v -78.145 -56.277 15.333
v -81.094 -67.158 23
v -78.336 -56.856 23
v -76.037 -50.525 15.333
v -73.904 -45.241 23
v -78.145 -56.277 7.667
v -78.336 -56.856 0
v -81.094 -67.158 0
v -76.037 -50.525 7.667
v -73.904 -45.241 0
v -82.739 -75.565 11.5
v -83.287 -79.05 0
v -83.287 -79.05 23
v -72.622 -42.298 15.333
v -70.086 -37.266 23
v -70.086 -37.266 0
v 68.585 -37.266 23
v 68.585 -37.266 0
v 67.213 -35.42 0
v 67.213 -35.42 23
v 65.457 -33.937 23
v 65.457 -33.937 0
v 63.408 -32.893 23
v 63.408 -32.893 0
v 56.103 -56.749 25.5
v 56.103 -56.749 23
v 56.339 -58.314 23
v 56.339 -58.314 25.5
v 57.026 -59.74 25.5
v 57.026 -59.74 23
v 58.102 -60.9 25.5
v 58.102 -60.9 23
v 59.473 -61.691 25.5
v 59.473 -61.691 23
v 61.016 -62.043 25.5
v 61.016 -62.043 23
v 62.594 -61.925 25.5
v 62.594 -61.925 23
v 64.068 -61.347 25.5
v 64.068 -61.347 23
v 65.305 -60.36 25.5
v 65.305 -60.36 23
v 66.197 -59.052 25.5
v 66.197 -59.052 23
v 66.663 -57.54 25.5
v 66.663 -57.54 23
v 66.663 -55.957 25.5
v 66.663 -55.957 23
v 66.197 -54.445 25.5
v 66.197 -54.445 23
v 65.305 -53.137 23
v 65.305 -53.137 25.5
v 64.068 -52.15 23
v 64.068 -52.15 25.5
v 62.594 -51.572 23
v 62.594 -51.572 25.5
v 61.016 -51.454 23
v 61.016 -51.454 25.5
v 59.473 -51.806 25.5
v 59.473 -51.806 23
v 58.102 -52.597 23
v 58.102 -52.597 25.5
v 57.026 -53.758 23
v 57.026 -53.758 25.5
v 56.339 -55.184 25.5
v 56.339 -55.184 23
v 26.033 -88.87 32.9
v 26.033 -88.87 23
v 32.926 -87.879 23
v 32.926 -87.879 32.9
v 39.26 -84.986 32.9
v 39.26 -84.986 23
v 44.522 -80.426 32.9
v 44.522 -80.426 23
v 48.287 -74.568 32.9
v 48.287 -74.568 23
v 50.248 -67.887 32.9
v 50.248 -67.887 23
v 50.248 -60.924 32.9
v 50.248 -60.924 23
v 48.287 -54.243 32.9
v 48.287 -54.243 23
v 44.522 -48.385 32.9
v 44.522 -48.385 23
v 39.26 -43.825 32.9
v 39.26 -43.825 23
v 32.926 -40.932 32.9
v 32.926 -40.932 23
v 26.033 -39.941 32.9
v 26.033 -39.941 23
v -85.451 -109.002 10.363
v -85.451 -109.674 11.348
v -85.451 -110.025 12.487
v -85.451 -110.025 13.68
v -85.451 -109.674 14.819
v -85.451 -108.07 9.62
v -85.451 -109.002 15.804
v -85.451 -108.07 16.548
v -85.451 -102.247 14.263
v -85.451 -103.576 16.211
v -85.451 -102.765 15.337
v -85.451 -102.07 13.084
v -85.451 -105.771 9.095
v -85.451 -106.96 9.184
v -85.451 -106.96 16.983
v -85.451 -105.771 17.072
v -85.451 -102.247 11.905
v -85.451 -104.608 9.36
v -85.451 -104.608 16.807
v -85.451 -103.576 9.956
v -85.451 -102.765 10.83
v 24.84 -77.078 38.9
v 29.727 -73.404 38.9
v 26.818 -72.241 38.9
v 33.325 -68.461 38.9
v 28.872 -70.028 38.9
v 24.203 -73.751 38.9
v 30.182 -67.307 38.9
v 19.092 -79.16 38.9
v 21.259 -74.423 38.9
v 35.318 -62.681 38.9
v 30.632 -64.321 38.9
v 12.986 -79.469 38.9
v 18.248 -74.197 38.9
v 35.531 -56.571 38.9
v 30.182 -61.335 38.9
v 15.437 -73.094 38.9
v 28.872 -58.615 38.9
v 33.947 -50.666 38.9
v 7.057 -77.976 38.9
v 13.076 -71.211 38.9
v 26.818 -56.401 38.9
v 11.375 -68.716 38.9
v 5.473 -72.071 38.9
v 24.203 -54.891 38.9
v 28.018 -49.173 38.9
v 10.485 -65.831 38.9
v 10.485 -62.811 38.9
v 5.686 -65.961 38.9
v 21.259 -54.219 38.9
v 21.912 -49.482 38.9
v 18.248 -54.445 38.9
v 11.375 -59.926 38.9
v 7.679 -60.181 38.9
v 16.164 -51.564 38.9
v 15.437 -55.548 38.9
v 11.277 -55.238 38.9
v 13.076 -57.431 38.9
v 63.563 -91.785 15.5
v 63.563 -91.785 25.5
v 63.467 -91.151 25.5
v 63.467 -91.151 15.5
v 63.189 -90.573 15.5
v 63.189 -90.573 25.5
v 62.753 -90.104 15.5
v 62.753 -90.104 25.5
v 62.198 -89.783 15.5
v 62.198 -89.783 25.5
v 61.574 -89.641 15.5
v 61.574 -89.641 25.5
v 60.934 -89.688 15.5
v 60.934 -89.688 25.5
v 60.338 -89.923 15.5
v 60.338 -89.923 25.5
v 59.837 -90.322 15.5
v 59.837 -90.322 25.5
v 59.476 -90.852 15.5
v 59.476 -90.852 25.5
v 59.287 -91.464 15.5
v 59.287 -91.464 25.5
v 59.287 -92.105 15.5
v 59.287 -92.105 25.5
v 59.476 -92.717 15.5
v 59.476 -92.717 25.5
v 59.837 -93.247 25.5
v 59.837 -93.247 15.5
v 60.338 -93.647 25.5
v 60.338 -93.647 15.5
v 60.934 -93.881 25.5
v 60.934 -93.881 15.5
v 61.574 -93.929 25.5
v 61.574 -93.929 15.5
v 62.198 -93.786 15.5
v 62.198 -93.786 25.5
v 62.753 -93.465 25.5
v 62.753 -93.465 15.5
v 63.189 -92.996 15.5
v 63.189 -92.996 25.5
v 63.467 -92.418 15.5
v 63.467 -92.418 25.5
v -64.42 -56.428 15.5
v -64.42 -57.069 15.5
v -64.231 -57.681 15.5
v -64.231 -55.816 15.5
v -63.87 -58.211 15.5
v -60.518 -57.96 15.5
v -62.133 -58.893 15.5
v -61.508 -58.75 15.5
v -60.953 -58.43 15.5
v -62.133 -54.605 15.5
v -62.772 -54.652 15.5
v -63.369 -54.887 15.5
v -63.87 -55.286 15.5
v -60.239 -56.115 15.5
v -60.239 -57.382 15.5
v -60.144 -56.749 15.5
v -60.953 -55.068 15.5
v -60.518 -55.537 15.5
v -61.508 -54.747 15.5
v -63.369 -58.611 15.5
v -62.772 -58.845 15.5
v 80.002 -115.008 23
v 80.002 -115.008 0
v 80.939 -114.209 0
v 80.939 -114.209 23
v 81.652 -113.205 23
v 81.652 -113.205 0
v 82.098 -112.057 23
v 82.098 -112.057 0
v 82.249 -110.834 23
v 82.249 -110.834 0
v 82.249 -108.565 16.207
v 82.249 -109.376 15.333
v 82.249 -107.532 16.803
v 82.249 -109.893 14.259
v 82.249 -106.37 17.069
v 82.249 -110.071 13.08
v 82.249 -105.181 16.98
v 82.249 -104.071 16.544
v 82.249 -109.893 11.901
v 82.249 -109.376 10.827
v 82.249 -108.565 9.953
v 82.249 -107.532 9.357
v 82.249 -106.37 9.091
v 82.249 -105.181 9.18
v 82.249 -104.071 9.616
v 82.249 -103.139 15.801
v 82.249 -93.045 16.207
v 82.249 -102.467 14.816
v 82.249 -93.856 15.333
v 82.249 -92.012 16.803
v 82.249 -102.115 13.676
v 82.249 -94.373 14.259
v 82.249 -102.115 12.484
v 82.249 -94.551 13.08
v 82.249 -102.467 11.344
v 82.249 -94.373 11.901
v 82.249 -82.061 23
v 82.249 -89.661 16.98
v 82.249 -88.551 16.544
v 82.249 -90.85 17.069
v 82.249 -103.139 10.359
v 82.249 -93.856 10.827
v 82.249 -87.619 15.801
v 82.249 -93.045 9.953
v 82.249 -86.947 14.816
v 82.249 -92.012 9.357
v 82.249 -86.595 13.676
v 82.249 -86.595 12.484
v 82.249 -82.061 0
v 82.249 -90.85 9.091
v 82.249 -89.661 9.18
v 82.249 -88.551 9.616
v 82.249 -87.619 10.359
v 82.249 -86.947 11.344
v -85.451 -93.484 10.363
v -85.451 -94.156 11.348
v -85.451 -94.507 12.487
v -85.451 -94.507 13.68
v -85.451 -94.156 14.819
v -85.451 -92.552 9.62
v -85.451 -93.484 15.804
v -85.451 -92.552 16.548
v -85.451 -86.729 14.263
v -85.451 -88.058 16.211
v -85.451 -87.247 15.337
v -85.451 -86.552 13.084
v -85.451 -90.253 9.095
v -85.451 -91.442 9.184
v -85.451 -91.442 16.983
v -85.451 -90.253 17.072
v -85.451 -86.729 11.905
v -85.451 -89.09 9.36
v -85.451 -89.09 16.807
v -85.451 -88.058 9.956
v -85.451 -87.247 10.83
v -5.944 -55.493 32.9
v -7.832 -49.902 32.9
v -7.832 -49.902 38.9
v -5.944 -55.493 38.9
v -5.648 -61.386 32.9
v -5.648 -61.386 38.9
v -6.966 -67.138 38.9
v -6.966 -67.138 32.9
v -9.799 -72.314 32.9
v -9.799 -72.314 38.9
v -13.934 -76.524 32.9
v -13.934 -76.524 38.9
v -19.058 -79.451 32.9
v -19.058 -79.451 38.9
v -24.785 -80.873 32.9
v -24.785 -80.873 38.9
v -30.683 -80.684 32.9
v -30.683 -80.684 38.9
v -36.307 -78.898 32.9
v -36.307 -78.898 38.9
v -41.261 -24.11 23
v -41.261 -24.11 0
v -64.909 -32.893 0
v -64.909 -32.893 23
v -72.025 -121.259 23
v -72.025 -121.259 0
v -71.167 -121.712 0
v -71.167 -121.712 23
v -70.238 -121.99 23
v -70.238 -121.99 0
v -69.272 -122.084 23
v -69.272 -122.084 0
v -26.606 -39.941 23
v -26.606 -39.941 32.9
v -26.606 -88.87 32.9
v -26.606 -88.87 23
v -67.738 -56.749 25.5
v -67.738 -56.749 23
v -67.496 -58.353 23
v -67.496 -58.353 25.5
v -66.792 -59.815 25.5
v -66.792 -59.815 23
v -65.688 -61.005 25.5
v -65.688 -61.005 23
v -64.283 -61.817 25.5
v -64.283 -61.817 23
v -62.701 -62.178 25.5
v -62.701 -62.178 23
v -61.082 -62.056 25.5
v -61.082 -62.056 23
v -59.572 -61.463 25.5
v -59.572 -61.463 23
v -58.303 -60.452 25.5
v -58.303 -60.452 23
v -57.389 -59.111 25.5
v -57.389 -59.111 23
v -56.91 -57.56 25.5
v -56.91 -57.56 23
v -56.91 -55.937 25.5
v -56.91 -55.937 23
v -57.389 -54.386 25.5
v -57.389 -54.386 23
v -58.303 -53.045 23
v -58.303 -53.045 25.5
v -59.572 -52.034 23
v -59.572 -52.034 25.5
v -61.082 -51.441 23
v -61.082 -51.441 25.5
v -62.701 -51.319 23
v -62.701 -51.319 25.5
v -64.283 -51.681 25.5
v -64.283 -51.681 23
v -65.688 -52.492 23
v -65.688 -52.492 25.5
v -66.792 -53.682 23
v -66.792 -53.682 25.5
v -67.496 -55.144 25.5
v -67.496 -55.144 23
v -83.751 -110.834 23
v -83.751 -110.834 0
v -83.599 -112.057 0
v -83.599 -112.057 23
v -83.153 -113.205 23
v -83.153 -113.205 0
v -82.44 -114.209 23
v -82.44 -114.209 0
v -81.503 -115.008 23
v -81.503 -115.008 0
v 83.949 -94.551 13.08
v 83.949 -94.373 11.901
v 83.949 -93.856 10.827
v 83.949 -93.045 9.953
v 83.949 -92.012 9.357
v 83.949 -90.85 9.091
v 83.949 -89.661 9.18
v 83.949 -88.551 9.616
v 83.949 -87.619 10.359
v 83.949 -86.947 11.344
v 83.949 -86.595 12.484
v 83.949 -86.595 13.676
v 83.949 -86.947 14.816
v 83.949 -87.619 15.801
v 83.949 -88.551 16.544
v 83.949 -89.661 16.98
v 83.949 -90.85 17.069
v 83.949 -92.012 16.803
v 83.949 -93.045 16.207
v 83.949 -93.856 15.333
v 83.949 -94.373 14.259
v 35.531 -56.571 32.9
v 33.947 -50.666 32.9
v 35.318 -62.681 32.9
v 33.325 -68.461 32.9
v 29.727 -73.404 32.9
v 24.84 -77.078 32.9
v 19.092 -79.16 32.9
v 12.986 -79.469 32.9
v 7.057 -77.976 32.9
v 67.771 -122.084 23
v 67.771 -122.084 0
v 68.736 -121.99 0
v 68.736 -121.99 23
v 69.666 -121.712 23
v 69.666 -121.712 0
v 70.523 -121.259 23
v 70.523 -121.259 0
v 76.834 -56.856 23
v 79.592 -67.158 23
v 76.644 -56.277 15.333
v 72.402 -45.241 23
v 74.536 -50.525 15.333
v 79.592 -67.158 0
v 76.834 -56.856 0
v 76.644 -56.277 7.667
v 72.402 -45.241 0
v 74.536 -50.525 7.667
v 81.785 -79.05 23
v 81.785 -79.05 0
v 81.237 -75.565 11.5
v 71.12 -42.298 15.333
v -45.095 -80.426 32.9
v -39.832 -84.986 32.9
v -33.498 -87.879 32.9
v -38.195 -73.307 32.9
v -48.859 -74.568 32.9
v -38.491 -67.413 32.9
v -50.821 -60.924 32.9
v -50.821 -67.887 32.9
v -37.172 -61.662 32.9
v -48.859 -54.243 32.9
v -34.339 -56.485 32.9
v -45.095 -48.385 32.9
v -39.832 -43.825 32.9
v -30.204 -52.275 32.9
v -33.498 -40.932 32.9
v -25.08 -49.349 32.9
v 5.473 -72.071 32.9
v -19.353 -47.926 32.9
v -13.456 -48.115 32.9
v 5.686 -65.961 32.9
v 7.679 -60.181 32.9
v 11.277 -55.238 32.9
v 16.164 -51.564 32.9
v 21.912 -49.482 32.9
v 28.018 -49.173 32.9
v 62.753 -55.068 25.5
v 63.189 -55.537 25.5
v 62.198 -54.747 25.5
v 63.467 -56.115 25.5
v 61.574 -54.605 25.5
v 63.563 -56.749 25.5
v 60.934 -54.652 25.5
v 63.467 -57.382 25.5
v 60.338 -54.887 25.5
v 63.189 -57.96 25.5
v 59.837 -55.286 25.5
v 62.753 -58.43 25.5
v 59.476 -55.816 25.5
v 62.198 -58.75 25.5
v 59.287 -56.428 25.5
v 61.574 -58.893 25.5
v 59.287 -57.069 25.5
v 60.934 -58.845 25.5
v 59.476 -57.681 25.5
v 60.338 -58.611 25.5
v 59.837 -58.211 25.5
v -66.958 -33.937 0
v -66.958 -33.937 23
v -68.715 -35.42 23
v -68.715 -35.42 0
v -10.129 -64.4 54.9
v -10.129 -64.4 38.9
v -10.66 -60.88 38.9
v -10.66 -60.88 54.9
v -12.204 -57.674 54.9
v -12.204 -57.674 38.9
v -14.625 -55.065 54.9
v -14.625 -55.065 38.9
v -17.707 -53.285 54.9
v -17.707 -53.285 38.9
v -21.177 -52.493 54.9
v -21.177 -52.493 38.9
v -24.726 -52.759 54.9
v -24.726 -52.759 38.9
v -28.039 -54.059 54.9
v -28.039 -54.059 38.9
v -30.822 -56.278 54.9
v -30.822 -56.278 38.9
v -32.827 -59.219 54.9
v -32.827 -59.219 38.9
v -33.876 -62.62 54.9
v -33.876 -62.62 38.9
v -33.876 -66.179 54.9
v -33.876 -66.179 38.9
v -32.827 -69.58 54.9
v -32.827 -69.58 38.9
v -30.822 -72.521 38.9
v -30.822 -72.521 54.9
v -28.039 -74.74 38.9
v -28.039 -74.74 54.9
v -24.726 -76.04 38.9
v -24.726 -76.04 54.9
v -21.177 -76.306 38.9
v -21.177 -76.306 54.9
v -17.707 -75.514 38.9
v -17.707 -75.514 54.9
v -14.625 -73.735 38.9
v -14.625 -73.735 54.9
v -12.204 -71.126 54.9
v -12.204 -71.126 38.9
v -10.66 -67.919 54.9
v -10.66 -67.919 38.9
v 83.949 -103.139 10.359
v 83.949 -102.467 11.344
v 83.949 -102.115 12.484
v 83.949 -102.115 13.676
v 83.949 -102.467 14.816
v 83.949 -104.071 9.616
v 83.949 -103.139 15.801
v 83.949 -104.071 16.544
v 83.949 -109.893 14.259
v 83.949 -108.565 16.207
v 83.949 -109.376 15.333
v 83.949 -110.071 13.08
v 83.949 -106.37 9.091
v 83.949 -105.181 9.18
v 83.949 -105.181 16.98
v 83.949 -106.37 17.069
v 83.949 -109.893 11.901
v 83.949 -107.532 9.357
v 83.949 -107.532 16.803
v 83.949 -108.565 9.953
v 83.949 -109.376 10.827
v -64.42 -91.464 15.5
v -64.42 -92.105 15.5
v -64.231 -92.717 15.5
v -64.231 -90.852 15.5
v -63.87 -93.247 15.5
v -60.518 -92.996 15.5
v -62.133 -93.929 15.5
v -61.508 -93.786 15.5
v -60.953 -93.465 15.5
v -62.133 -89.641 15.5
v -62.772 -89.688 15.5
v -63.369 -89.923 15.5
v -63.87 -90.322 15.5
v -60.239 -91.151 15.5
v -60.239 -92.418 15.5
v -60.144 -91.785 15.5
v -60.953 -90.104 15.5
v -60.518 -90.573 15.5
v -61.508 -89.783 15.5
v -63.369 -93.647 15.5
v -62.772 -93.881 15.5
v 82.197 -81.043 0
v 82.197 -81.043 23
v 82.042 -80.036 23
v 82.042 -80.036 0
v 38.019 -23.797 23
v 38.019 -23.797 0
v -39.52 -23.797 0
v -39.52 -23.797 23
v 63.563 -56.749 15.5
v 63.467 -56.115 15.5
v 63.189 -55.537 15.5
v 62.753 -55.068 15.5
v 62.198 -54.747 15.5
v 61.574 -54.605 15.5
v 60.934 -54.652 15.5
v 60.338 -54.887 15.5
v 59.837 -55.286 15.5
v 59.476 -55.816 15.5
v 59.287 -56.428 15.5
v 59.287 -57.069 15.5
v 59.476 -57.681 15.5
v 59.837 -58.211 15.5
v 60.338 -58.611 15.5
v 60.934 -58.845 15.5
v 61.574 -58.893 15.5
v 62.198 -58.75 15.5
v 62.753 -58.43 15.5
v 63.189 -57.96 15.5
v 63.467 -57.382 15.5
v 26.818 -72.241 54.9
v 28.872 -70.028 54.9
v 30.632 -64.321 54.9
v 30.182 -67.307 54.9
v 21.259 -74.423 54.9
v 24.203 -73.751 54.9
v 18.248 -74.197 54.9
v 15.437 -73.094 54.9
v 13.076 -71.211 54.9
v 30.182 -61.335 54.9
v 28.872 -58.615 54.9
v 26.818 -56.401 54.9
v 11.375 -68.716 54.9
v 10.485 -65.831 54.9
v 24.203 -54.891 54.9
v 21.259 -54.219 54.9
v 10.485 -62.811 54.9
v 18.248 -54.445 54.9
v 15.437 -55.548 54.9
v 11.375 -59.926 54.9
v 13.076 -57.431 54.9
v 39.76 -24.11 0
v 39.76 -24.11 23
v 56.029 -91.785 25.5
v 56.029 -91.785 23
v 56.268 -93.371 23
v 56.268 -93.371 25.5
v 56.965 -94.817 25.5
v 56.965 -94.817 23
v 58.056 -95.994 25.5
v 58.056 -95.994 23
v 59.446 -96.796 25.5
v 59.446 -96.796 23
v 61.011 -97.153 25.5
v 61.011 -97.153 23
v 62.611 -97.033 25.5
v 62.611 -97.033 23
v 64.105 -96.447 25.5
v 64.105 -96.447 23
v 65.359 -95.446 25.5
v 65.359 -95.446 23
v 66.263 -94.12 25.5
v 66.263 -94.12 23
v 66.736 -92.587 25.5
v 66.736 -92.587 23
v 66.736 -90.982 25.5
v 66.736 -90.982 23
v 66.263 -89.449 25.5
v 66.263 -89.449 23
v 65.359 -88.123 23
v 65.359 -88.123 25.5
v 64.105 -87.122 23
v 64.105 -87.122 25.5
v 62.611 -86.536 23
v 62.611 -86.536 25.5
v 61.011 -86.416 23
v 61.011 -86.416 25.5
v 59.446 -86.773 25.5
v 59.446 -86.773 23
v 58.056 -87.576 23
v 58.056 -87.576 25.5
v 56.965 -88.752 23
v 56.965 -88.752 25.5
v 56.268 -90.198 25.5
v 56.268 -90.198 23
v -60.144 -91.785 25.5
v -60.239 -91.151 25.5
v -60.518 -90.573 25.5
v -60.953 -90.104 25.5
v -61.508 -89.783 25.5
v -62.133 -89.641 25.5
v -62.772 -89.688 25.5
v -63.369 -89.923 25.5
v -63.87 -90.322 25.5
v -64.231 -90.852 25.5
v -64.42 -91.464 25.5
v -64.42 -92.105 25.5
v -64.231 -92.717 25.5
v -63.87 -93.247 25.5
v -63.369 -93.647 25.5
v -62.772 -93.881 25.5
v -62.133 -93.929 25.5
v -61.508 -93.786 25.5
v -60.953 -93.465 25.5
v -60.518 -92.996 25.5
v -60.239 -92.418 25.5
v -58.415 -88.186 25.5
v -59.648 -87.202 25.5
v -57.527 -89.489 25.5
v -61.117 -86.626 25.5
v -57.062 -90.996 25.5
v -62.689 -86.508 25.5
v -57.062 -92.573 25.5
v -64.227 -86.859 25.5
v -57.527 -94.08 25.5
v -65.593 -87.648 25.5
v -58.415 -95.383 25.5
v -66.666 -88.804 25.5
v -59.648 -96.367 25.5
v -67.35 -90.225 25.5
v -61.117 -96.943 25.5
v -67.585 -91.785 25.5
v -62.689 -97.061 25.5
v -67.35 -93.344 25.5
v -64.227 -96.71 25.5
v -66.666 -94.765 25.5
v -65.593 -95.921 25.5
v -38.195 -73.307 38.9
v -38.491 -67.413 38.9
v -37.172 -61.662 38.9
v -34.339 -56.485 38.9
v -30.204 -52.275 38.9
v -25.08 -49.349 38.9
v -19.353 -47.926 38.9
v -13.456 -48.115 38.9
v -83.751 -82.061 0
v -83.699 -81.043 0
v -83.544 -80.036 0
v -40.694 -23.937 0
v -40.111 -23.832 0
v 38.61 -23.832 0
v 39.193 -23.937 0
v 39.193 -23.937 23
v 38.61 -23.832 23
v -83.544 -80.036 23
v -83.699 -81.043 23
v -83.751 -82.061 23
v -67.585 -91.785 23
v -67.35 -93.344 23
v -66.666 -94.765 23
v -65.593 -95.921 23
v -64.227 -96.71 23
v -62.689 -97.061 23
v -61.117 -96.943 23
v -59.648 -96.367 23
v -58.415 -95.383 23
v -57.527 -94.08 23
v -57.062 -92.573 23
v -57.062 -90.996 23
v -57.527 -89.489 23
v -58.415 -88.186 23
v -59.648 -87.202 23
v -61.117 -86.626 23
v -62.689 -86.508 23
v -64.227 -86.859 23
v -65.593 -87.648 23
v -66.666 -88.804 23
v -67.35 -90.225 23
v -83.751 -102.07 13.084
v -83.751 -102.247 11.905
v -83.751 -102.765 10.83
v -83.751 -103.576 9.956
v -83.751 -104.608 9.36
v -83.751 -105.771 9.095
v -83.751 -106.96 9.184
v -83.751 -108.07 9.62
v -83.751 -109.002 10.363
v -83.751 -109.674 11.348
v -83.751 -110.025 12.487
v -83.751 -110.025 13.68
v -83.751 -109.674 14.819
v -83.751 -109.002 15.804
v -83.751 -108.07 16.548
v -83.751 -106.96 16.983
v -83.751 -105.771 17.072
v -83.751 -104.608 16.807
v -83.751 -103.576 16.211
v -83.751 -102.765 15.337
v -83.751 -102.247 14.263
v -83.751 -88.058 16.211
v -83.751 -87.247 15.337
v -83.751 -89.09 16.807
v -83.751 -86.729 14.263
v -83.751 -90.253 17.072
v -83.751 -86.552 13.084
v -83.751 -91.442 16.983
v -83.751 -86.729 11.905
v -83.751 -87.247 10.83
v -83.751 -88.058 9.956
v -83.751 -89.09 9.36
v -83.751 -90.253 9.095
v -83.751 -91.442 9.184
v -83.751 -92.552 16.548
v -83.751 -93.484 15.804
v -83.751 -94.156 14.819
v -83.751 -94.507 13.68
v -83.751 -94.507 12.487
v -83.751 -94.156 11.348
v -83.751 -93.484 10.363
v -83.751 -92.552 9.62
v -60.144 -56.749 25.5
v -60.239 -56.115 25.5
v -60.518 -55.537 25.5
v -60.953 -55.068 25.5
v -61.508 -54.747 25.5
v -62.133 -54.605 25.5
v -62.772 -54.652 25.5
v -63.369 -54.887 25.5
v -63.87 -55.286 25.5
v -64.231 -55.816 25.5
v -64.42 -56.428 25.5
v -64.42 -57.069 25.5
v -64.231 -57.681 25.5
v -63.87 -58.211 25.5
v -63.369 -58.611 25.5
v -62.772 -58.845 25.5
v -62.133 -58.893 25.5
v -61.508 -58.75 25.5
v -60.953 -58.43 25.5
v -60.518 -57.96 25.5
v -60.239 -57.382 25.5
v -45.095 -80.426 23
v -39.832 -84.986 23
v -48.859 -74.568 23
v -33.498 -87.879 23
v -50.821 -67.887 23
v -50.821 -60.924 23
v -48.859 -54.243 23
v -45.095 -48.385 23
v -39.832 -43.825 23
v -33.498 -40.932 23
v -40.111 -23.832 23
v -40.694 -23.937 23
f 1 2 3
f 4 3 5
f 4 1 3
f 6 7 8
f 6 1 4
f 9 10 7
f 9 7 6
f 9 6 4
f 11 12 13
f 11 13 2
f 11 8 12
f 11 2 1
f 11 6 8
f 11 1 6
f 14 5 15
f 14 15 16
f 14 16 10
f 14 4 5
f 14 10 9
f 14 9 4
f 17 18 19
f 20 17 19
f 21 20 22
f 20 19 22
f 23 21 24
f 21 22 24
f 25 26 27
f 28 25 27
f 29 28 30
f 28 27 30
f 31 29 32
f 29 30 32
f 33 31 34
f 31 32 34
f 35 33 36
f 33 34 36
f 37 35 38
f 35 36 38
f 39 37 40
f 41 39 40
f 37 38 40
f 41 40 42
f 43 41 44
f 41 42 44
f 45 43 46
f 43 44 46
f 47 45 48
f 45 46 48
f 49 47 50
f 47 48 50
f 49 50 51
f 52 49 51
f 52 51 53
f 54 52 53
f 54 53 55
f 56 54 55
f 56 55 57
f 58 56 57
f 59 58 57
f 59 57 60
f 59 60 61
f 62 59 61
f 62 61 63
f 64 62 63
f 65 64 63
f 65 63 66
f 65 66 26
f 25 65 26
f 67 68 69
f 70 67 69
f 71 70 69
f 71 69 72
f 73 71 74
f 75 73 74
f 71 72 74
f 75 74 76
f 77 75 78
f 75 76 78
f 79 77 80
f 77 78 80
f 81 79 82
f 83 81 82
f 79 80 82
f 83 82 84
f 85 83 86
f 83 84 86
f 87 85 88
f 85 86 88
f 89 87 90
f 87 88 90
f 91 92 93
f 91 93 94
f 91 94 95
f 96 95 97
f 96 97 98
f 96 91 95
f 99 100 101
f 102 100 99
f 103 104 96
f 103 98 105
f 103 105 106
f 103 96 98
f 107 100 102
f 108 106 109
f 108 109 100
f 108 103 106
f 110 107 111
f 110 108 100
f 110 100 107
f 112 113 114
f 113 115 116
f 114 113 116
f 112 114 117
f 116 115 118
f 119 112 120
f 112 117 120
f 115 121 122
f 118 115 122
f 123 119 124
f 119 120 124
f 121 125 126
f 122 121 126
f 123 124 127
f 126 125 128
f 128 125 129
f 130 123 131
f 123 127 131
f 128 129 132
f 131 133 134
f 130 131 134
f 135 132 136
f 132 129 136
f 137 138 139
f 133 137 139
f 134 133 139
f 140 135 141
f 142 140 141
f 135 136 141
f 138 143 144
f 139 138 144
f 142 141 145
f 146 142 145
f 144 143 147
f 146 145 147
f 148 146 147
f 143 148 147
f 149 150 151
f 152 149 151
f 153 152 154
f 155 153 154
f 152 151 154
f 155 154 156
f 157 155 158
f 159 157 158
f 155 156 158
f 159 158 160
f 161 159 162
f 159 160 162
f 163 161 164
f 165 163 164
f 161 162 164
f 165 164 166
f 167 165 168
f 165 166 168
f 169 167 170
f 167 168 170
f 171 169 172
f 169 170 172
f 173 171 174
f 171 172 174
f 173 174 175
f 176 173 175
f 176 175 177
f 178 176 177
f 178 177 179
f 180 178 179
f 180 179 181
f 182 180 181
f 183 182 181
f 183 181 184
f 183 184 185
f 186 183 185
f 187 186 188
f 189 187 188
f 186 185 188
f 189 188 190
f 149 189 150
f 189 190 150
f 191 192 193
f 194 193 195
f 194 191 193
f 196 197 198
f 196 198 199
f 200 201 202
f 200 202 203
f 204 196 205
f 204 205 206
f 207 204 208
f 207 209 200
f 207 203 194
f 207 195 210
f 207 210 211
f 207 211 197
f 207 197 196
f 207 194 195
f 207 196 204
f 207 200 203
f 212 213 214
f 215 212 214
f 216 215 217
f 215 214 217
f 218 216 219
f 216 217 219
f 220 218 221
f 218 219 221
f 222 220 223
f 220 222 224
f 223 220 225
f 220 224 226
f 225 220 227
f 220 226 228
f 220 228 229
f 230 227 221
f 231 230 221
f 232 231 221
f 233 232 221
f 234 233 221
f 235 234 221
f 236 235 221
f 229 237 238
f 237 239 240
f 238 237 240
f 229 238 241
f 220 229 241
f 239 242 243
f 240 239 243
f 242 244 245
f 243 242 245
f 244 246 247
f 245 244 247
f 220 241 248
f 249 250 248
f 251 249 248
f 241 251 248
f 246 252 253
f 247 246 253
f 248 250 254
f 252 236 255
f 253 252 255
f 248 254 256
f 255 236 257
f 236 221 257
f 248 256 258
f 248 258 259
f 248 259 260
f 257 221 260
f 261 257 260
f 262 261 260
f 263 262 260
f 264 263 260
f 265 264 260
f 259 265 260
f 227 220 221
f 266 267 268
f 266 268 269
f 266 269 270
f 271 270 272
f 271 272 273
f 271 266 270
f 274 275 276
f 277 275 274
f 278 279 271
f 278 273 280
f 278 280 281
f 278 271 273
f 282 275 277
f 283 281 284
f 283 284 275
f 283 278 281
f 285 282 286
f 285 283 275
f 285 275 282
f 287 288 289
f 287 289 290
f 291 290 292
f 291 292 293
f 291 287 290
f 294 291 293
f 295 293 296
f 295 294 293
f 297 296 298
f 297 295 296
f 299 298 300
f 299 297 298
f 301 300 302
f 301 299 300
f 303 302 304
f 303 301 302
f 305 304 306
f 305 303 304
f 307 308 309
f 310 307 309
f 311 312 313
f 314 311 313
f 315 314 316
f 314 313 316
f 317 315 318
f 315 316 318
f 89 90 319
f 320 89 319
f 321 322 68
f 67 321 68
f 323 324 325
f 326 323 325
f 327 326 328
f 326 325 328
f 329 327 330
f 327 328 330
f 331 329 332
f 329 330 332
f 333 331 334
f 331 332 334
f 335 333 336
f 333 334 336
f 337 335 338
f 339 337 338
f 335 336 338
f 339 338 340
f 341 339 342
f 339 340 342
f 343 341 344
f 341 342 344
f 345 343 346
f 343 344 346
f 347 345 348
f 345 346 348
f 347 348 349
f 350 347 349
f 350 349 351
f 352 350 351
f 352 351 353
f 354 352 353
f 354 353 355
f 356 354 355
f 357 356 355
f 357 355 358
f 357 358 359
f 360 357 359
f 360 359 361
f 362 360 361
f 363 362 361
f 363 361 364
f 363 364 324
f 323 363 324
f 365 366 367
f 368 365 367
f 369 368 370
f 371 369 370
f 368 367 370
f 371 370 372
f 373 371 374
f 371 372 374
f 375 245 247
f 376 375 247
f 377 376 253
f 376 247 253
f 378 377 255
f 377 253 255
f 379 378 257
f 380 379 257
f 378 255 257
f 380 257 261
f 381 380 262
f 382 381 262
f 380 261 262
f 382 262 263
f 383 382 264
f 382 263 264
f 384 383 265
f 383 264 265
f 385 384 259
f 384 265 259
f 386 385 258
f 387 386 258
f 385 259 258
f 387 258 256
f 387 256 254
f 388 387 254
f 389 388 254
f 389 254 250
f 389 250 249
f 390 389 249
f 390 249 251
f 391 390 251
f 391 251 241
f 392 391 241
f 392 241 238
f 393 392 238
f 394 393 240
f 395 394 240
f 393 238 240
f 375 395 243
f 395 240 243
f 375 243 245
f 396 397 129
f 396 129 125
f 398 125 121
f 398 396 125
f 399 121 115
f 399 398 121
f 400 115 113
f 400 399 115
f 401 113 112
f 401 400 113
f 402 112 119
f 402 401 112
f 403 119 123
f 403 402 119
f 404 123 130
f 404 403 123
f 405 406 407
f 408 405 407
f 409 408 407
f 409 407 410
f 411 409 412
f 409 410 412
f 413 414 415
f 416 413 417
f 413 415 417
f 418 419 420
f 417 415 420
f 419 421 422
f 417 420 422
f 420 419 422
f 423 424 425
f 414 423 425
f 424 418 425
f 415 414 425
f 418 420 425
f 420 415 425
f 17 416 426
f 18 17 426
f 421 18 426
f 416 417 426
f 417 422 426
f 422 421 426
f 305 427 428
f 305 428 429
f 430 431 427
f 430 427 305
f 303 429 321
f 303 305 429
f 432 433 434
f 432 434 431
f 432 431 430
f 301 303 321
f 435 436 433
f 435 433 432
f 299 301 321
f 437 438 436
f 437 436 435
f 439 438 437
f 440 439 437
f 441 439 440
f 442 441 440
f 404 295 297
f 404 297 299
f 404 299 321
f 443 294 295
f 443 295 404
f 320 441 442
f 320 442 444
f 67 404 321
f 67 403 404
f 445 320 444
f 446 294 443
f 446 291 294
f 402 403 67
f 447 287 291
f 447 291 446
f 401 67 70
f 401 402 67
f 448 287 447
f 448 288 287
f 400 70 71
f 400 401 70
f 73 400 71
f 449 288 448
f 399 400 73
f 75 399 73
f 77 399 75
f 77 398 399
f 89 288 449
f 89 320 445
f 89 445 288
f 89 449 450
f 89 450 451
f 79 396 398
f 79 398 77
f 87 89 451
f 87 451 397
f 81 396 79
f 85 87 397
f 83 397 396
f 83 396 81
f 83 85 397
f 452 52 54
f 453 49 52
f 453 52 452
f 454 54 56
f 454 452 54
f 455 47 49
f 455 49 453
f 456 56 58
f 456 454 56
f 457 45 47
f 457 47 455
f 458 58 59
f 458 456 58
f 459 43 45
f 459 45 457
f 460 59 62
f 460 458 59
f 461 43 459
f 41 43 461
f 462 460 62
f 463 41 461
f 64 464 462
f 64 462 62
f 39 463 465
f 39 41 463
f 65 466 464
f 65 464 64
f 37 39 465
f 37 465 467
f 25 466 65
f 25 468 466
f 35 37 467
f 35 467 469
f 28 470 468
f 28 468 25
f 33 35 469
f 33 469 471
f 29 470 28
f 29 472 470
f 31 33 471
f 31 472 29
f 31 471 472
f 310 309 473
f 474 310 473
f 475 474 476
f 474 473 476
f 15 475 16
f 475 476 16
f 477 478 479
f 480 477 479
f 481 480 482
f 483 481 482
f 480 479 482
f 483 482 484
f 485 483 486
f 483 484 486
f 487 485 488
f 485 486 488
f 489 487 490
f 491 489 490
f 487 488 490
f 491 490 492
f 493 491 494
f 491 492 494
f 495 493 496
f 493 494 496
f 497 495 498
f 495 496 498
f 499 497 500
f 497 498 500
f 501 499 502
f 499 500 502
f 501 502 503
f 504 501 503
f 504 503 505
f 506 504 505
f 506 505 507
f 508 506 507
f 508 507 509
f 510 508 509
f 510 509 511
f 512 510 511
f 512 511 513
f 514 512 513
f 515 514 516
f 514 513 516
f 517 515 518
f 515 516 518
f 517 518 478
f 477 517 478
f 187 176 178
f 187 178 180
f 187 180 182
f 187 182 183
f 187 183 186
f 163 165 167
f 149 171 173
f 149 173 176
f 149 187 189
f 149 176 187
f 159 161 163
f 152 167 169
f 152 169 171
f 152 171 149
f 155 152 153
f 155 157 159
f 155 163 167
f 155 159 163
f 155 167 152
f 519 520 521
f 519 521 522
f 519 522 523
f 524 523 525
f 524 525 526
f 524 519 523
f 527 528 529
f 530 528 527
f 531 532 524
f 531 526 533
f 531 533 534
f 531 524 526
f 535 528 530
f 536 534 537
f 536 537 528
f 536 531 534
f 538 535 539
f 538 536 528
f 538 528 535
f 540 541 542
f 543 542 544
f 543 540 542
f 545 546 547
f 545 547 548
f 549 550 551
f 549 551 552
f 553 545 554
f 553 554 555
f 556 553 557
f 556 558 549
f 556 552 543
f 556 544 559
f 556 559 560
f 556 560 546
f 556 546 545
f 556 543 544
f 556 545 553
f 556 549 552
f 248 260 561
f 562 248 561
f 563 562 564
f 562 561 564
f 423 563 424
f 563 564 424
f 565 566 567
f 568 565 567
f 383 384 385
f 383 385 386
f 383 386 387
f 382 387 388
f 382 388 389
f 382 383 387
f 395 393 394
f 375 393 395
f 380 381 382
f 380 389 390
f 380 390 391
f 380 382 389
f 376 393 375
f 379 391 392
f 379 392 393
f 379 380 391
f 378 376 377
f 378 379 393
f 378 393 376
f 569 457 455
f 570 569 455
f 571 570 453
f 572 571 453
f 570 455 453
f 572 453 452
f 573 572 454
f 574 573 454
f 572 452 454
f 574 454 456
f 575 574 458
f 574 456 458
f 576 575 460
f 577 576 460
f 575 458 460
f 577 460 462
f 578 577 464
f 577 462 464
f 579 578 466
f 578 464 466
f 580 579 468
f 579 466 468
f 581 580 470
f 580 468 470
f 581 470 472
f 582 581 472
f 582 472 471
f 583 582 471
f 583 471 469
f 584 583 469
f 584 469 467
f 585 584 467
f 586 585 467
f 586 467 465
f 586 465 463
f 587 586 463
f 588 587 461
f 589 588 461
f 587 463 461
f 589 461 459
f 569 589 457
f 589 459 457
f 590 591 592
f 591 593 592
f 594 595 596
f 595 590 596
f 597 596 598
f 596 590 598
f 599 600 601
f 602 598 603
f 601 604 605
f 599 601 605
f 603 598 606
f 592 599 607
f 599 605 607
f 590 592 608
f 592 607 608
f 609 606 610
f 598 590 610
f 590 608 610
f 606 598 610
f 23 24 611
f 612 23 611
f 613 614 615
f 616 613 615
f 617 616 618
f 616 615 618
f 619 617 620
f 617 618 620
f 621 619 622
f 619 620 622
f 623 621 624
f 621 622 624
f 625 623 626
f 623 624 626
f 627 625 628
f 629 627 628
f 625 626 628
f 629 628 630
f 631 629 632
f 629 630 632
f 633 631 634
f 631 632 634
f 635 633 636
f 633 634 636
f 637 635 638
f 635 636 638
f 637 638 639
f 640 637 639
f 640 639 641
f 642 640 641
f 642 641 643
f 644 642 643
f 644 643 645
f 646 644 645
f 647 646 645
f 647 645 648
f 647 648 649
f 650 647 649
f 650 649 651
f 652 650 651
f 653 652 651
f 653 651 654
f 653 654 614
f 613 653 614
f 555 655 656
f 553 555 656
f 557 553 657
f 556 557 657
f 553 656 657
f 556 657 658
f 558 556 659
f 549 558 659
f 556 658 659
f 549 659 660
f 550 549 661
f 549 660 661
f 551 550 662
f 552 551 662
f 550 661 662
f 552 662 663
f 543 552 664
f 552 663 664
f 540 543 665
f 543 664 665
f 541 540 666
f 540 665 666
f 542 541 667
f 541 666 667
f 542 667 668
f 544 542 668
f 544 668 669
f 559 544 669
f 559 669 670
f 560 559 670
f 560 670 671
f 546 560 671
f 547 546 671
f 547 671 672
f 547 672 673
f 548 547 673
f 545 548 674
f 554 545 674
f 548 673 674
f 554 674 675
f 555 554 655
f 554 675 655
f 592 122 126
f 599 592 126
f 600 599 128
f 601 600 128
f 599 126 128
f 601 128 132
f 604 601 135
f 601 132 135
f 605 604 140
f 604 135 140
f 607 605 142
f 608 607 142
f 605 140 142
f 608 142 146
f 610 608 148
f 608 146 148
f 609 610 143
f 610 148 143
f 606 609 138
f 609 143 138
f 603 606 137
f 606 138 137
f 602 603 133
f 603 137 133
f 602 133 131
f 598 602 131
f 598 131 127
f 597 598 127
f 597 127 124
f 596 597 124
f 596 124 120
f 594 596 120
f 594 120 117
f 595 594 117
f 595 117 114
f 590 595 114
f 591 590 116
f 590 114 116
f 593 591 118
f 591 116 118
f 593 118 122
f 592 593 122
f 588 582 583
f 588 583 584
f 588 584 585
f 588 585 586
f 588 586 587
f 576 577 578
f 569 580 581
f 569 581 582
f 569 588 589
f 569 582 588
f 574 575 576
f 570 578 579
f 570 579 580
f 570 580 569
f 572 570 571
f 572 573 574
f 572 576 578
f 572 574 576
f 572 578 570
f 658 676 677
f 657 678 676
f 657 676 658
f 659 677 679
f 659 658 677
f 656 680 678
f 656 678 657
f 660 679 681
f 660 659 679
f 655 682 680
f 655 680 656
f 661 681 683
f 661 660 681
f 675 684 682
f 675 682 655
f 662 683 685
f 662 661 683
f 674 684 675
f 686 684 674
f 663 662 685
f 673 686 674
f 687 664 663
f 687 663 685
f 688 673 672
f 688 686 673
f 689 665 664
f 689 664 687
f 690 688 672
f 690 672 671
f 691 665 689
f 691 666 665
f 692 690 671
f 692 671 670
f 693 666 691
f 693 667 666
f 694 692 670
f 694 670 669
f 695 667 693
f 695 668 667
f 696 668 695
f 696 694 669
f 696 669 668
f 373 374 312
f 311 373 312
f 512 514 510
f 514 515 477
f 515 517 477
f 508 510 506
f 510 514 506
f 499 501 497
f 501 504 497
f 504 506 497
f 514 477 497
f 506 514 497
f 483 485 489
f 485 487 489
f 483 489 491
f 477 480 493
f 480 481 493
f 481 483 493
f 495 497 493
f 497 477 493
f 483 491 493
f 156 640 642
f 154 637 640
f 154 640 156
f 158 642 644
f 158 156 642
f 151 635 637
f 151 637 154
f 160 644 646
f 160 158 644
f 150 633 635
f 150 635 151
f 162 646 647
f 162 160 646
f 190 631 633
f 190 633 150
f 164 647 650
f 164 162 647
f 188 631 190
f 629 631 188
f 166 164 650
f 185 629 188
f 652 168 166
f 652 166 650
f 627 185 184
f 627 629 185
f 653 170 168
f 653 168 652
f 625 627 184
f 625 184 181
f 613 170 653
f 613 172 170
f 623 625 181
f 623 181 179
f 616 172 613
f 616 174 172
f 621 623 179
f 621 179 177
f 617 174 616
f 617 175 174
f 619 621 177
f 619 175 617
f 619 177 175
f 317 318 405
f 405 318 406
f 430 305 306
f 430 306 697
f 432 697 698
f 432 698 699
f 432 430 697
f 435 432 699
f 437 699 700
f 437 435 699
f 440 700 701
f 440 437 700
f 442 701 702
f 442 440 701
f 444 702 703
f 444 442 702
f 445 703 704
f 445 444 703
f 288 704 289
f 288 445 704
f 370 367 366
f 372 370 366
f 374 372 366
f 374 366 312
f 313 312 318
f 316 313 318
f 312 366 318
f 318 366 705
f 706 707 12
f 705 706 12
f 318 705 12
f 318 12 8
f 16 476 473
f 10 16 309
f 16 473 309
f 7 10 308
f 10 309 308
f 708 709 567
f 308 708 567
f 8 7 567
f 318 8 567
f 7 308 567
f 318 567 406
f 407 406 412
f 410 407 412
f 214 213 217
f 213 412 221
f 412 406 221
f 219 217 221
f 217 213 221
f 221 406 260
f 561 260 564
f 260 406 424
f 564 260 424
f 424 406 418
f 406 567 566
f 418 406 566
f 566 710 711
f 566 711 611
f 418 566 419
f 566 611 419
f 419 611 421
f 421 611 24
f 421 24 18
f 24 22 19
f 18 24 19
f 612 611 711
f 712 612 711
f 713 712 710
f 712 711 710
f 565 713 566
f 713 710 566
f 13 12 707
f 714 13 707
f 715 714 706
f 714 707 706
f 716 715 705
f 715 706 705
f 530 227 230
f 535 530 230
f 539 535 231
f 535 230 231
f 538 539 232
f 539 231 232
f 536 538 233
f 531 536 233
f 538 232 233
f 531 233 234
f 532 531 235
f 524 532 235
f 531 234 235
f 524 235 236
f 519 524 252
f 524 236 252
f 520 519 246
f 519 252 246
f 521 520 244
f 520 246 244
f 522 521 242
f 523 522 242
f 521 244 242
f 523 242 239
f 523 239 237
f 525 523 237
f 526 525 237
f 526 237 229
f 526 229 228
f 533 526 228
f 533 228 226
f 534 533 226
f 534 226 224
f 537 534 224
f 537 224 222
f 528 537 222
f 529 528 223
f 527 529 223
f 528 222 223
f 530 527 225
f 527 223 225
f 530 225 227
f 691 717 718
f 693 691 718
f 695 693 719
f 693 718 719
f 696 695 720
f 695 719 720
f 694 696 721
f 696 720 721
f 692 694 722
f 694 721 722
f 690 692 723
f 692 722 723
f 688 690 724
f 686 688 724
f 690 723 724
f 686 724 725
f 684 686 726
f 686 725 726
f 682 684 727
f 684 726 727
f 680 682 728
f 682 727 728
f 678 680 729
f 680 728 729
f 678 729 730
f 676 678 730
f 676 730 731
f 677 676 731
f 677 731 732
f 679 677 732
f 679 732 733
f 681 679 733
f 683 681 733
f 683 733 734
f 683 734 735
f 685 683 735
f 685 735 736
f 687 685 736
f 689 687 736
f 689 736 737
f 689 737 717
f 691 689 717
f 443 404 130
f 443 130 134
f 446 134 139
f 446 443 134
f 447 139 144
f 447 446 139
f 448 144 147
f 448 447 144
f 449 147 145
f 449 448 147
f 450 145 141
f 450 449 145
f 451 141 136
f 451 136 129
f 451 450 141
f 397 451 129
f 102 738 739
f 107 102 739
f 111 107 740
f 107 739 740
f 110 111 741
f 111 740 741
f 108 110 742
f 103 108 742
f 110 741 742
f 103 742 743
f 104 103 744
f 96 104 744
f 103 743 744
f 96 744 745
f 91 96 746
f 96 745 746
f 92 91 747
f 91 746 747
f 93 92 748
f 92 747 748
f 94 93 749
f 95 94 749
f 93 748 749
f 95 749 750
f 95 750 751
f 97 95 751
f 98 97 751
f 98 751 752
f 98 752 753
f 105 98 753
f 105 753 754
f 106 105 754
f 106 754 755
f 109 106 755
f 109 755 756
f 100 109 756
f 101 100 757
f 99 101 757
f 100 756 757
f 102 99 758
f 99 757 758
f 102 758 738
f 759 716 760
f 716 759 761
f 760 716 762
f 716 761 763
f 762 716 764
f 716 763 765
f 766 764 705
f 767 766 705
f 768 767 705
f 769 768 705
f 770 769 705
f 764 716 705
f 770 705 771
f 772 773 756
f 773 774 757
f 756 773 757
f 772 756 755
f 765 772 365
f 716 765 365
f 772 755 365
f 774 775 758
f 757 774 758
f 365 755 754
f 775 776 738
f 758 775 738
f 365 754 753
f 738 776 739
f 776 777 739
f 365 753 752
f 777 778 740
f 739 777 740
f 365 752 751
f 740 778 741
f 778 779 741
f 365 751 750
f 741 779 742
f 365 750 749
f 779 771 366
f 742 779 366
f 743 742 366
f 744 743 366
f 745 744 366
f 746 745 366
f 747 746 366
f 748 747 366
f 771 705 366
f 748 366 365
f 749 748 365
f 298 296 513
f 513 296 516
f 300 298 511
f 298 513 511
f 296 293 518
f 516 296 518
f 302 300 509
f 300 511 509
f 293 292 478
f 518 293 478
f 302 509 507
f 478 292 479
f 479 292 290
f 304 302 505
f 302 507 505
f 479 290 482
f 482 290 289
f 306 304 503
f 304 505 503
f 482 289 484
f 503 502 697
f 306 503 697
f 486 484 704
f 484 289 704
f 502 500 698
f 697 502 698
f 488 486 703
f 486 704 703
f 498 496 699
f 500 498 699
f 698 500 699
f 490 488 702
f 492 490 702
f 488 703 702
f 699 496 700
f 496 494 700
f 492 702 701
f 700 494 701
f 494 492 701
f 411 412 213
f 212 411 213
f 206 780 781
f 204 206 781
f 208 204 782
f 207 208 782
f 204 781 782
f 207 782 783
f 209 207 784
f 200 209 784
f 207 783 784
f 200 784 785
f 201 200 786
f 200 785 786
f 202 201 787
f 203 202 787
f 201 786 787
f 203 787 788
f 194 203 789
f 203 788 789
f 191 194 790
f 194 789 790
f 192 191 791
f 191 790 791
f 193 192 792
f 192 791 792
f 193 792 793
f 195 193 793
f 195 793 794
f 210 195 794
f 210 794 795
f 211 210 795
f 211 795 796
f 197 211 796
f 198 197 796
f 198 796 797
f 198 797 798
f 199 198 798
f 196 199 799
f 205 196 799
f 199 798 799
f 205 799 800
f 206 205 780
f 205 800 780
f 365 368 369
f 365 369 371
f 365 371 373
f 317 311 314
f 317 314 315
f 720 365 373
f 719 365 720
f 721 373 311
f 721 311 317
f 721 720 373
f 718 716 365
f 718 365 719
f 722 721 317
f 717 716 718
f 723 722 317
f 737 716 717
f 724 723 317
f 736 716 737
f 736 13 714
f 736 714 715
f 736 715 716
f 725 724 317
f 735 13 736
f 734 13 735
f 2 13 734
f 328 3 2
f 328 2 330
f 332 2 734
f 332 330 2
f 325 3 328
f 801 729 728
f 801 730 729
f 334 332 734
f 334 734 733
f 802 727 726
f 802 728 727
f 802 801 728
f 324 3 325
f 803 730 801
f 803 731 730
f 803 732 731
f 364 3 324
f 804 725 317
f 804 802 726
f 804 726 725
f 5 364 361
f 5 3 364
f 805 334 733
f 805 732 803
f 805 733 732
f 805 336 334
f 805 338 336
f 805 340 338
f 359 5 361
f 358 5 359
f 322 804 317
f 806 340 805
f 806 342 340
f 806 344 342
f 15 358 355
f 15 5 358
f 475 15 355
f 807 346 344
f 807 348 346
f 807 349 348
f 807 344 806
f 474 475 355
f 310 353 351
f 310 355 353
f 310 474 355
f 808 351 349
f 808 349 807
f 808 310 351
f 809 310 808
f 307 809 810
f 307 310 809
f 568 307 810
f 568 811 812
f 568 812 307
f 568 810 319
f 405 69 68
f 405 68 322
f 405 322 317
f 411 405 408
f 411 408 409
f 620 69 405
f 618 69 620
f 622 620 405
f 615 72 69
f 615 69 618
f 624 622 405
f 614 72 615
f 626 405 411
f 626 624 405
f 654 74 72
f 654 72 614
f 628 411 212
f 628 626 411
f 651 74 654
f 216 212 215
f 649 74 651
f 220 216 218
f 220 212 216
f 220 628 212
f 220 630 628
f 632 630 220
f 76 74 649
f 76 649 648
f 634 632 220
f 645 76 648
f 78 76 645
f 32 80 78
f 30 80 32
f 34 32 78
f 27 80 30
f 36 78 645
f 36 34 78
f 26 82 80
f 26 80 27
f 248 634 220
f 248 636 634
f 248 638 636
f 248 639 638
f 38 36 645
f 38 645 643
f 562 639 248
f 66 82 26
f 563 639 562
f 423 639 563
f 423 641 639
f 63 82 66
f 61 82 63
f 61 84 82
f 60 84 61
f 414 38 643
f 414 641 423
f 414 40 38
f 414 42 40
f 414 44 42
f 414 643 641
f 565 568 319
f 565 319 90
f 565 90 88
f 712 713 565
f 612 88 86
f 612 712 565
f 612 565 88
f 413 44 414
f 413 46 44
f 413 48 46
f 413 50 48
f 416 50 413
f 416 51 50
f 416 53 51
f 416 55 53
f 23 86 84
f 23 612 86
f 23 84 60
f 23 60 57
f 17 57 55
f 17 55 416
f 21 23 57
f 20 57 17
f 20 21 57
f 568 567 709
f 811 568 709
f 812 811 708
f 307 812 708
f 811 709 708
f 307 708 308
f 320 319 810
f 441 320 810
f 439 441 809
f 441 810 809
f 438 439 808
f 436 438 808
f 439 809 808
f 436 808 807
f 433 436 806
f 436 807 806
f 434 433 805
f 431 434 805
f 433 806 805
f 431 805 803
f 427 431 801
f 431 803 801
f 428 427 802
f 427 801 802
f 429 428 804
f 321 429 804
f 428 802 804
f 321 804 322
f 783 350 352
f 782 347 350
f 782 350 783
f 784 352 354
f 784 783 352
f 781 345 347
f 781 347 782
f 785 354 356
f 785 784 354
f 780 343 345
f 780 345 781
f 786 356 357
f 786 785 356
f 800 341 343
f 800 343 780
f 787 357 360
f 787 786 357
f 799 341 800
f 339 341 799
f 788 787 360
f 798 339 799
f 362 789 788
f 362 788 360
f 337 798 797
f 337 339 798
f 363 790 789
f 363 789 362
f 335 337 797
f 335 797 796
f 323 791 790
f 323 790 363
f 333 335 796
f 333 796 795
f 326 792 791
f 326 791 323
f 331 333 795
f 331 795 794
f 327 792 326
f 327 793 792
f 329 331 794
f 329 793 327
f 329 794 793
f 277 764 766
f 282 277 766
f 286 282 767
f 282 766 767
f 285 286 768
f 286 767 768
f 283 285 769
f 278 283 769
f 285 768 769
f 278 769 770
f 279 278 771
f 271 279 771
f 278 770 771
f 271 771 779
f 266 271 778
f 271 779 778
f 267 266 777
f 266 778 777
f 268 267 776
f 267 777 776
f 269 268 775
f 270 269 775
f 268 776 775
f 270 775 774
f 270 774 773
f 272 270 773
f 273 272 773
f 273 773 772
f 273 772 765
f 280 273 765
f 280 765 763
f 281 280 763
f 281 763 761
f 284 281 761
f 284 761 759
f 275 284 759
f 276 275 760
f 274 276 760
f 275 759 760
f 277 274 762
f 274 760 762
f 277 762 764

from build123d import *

# Parameters (mm, degrees)
BOSS_EXTRUDE1_DEPTH = 23
SKETCH5_R           = 4
BOSS_EXTRUDE3_DEPTH = 1.7
SKETCH8_R           = 4
BOSS_EXTRUDE4_DEPTH = 1.7
SKETCH12_R          = 5.309585237
SKETCH12_R_2        = 5.383577716
SKETCH12_R_3        = 5.290961271
SKETCH12_R_4        = 5.444301549
BOSS_EXTRUDE5_DEPTH = 9.9
BOSS_EXTRUDE6_DEPTH = 22
CUT_EXTRUDE1_START  = -16
SKETCH16_R          = 11.94
CUT_EXTRUDE1_DEPTH  = 16
CUT_EXTRUDE2_START  = -16
SKETCH17_R          = 10.13
CUT_EXTRUDE2_DEPTH  = 16
CUT_EXTRUDE3_START  = -7.4
SKETCH18_R          = 5.309585237
CUT_EXTRUDE3_DEPTH  = 7.4
CUT_EXTRUDE4_START  = -7.4
SKETCH19_R          = 5.383577716
CUT_EXTRUDE4_DEPTH  = 7.4
CUT_EXTRUDE5_START  = -7.4
SKETCH20_R          = 5.444301549
CUT_EXTRUDE5_DEPTH  = 7.4
CUT_EXTRUDE6_START  = -7.4
SKETCH21_R          = 5.290961271
CUT_EXTRUDE6_DEPTH  = 7.4
SKETCH22_R          = 2.15
CUT_EXTRUDE7_DEPTH  = 10


with BuildPart() as part:
    # Sketch2 → Boss-Extrude1 (new body)
    with BuildSketch(Plane.XY):
        with BuildLine():
            Line((70.523413182, -121.258597495), (80.001788964, -115.008475165))
            ThreePointArc((80.001788964, -115.008475165), (81.651709385, -113.204688447), (82.249297777, -110.834293536))
            Line((82.249297777, -110.834293536), (82.249297777, -82.060728072))
            ThreePointArc((82.249297777, -82.060728072), (82.132627635, -80.537642087), (81.785339594, -79.050095835))
            add(Edge.make_bspline(
                [(81.785339594, -79.050095835), (81.779550585, -79.03175941), (79.763594577, -64.21980724), (72.310783114, -44.632084365), (70.089271073, -39.87053002), (68.584818962, -37.26596578)],
                knots=[0.01010668, 0.01010668, 0.01010668, 0.01010668, 0.430228508, 0.512694162, 0.834763224, 0.834763224, 0.834763224, 0.834763224], degree=3))
            ThreePointArc((68.584818962, -37.26596578), (66.377835563, -34.627803803), (63.407507036, -32.893496223))
            Line((63.407507036, -32.893496223), (39.759590264, -24.109812278))
            ThreePointArc((39.759590264, -24.109812278), (38.90305511, -23.875770322), (38.018627658, -23.796927511))
            Line((38.018627658, -23.796927511), (-39.520032104, -23.796927511))
            ThreePointArc((-39.520032104, -23.796927511), (-40.404459556, -23.875770322), (-41.26099471, -24.109812278))
            Line((-41.26099471, -24.109812278), (-64.908911482, -32.893496223))
            ThreePointArc((-64.908911482, -32.893496223), (-67.879240009, -34.627803803), (-70.086223408, -37.26596578))
            add(Edge.make_bspline(
                [(-83.28674404, -79.050095835), (-83.280955031, -79.03175941), (-81.264999023, -64.21980724), (-73.81218756, -44.632084365), (-71.590675519, -39.87053002), (-70.086223408, -37.26596578)],
                knots=[0.01010668, 0.01010668, 0.01010668, 0.01010668, 0.430228508, 0.512694162, 0.834763224, 0.834763224, 0.834763224, 0.834763224], degree=3))
            ThreePointArc((-83.28674404, -79.050095835), (-83.634032081, -80.537642087), (-83.750702223, -82.060728072))
            Line((-83.750702223, -82.060728072), (-83.750702223, -110.834293536))
            ThreePointArc((-83.750702223, -110.834293536), (-83.153113831, -113.204688447), (-81.50319341, -115.008475165))
            Line((-81.50319341, -115.008475165), (-72.024817629, -121.258597495))
            ThreePointArc((-72.024817629, -121.258597495), (-70.709179228, -121.873513284), (-69.272326442, -122.084415867))
            Line((-69.272326442, -122.084415867), (67.770921996, -122.084415867))
            ThreePointArc((67.770921996, -122.084415867), (69.207774782, -121.873513284), (70.523413182, -121.258597495))
        make_face()
    extrude(amount=BOSS_EXTRUDE1_DEPTH)

    # Sketch5 → Boss-Extrude3 (add)
    with BuildSketch(Plane.ZY.offset(83.750702223)):
        with Locations(Location((13.083649818, -90.551709518, 0), (0, 0, 90))):
            Circle(SKETCH5_R)
        with Locations(Location((13.083649818, -106.069633318, 0), (0, 0, 90))):
            Circle(SKETCH5_R)
    extrude(amount=BOSS_EXTRUDE3_DEPTH)

    # Sketch8 → Boss-Extrude4 (add)
    with BuildSketch(Plane(origin=(82.249297777, 0, 0), x_dir=(0, 0, -1), z_dir=(1, 0, 0))):
        with Locations(Location((-13.08, -90.550728072, 0), (0, 0, 270))):
            Circle(SKETCH8_R)
        with Locations(Location((-13.08, -106.070728072, 0), (0, 0, 270))):
            Circle(SKETCH8_R)
    extrude(amount=BOSS_EXTRUDE4_DEPTH)

    # Sketch12 → Boss-Extrude5 (add)
    with BuildSketch(Plane.XY.offset(23)):
        with Locations(Location((61.412858859, -56.74856372, 0), (0, 0, 180))):
            Circle(SKETCH12_R)
        with Locations(Location((61.412858859, -91.784557501, 0), (0, 0, 180))):
            Circle(SKETCH12_R_2)
        with Locations(Location((-62.293922582, -91.784557501, 0), (0, 0, 180))):
            Circle(SKETCH12_R_3)
        with Locations(Location((-62.293922582, -56.74856372, 0), (0, 0, 180))):
            Circle(SKETCH12_R_4)
        with BuildLine():
            Line((26.03317791, -39.941081705), (-26.605656617, -39.941081705))
            ThreePointArc((-26.605656617, -39.941081705), (-51.069934746, -64.405359834), (-26.605656617, -88.869637962))
            Line((-26.605656617, -88.869637962), (26.03317791, -88.869637962))
            ThreePointArc((26.03317791, -88.869637962), (50.497456038, -64.405359834), (26.03317791, -39.941081705))
        make_face()
    extrude(amount=BOSS_EXTRUDE5_DEPTH)

    # Sketch15 → Boss-Extrude6 (add)
    with BuildSketch(Plane.XY.offset(32.9)):
        with BuildLine():
            ThreePointArc((-36.30694092, -78.897586955), (-32.416918561, -54.237740907), (-7.831564022, -49.901772358))
            ThreePointArc((-7.831564022, -49.901772358), (-11.721586381, -74.561618406), (-36.30694092, -78.897586955))
        make_face()
        with BuildLine():
            ThreePointArc((33.947027157, -50.665986501), (29.727203797, -73.404384895), (7.056950152, -77.976175614))
            ThreePointArc((7.056950152, -77.976175614), (11.276773512, -55.23777722), (33.947027157, -50.665986501))
        make_face()
    extrude(amount=BOSS_EXTRUDE6_DEPTH)

    # Sketch16 → Cut-Extrude1 (cut)
    with BuildSketch(Plane.XY.offset(54.9).offset(CUT_EXTRUDE1_START)):
        with BuildLine():
            ThreePointArc((-36.30694092, -78.897586955), (-32.416918561, -54.237740907), (-7.831564022, -49.901772358))
            ThreePointArc((-7.831564022, -49.901772358), (-11.721586381, -74.561618406), (-36.30694092, -78.897586955))
        make_face()
        with Locations((-22.069252471, -64.399679657)):
            Circle(SKETCH16_R, mode=Mode.SUBTRACT)
    extrude(amount=CUT_EXTRUDE1_DEPTH, mode=Mode.SUBTRACT)

    # Sketch17 → Cut-Extrude2 (cut)
    with BuildSketch(Plane.XY.offset(54.9).offset(CUT_EXTRUDE2_START)):
        with BuildLine():
            ThreePointArc((7.056950152, -77.976175614), (11.276773512, -55.23777722), (33.947027157, -50.665986501))
            ThreePointArc((33.947027157, -50.665986501), (29.727203797, -73.404384895), (7.056950152, -77.976175614))
        make_face()
        with Locations((20.501988655, -64.321081058)):
            Circle(SKETCH17_R, mode=Mode.SUBTRACT)
    extrude(amount=CUT_EXTRUDE2_DEPTH, mode=Mode.SUBTRACT)

    # Sketch18 → Cut-Extrude3 (cut)
    with BuildSketch(Plane.XY.offset(32.9).offset(CUT_EXTRUDE3_START)):
        with Locations(Location((61.412858859, -56.74856372, 0), (0, 0, 180))):
            Circle(SKETCH18_R)
    extrude(amount=CUT_EXTRUDE3_DEPTH, mode=Mode.SUBTRACT)

    # Sketch19 → Cut-Extrude4 (cut)
    with BuildSketch(Plane.XY.offset(32.9).offset(CUT_EXTRUDE4_START)):
        with Locations(Location((61.412858859, -91.784557501, 0), (0, 0, 180))):
            Circle(SKETCH19_R)
    extrude(amount=CUT_EXTRUDE4_DEPTH, mode=Mode.SUBTRACT)

    # Sketch20 → Cut-Extrude5 (cut)
    with BuildSketch(Plane.XY.offset(32.9).offset(CUT_EXTRUDE5_START)):
        with Locations(Location((-62.293922582, -56.74856372, 0), (0, 0, 180))):
            Circle(SKETCH20_R)
    extrude(amount=CUT_EXTRUDE5_DEPTH, mode=Mode.SUBTRACT)

    # Sketch21 → Cut-Extrude6 (cut)
    with BuildSketch(Plane.XY.offset(32.9).offset(CUT_EXTRUDE6_START)):
        with Locations(Location((-62.293922582, -91.784557501, 0), (0, 0, 180))):
            Circle(SKETCH21_R)
    extrude(amount=CUT_EXTRUDE6_DEPTH, mode=Mode.SUBTRACT)

    # Sketch22 → Cut-Extrude7 (cut)
    with BuildSketch(Plane.XY.offset(25.5)):
        with Locations((-62.293922582, -56.74856372)):
            Circle(SKETCH22_R)
        with Locations((-62.293922582, -91.784557501)):
            Circle(SKETCH22_R)
        with Locations((61.412858859, -91.784557501)):
            Circle(SKETCH22_R)
        with Locations((61.412858859, -56.74856372)):
            Circle(SKETCH22_R)
    extrude(amount=-CUT_EXTRUDE7_DEPTH, mode=Mode.SUBTRACT)


solid = part.part
